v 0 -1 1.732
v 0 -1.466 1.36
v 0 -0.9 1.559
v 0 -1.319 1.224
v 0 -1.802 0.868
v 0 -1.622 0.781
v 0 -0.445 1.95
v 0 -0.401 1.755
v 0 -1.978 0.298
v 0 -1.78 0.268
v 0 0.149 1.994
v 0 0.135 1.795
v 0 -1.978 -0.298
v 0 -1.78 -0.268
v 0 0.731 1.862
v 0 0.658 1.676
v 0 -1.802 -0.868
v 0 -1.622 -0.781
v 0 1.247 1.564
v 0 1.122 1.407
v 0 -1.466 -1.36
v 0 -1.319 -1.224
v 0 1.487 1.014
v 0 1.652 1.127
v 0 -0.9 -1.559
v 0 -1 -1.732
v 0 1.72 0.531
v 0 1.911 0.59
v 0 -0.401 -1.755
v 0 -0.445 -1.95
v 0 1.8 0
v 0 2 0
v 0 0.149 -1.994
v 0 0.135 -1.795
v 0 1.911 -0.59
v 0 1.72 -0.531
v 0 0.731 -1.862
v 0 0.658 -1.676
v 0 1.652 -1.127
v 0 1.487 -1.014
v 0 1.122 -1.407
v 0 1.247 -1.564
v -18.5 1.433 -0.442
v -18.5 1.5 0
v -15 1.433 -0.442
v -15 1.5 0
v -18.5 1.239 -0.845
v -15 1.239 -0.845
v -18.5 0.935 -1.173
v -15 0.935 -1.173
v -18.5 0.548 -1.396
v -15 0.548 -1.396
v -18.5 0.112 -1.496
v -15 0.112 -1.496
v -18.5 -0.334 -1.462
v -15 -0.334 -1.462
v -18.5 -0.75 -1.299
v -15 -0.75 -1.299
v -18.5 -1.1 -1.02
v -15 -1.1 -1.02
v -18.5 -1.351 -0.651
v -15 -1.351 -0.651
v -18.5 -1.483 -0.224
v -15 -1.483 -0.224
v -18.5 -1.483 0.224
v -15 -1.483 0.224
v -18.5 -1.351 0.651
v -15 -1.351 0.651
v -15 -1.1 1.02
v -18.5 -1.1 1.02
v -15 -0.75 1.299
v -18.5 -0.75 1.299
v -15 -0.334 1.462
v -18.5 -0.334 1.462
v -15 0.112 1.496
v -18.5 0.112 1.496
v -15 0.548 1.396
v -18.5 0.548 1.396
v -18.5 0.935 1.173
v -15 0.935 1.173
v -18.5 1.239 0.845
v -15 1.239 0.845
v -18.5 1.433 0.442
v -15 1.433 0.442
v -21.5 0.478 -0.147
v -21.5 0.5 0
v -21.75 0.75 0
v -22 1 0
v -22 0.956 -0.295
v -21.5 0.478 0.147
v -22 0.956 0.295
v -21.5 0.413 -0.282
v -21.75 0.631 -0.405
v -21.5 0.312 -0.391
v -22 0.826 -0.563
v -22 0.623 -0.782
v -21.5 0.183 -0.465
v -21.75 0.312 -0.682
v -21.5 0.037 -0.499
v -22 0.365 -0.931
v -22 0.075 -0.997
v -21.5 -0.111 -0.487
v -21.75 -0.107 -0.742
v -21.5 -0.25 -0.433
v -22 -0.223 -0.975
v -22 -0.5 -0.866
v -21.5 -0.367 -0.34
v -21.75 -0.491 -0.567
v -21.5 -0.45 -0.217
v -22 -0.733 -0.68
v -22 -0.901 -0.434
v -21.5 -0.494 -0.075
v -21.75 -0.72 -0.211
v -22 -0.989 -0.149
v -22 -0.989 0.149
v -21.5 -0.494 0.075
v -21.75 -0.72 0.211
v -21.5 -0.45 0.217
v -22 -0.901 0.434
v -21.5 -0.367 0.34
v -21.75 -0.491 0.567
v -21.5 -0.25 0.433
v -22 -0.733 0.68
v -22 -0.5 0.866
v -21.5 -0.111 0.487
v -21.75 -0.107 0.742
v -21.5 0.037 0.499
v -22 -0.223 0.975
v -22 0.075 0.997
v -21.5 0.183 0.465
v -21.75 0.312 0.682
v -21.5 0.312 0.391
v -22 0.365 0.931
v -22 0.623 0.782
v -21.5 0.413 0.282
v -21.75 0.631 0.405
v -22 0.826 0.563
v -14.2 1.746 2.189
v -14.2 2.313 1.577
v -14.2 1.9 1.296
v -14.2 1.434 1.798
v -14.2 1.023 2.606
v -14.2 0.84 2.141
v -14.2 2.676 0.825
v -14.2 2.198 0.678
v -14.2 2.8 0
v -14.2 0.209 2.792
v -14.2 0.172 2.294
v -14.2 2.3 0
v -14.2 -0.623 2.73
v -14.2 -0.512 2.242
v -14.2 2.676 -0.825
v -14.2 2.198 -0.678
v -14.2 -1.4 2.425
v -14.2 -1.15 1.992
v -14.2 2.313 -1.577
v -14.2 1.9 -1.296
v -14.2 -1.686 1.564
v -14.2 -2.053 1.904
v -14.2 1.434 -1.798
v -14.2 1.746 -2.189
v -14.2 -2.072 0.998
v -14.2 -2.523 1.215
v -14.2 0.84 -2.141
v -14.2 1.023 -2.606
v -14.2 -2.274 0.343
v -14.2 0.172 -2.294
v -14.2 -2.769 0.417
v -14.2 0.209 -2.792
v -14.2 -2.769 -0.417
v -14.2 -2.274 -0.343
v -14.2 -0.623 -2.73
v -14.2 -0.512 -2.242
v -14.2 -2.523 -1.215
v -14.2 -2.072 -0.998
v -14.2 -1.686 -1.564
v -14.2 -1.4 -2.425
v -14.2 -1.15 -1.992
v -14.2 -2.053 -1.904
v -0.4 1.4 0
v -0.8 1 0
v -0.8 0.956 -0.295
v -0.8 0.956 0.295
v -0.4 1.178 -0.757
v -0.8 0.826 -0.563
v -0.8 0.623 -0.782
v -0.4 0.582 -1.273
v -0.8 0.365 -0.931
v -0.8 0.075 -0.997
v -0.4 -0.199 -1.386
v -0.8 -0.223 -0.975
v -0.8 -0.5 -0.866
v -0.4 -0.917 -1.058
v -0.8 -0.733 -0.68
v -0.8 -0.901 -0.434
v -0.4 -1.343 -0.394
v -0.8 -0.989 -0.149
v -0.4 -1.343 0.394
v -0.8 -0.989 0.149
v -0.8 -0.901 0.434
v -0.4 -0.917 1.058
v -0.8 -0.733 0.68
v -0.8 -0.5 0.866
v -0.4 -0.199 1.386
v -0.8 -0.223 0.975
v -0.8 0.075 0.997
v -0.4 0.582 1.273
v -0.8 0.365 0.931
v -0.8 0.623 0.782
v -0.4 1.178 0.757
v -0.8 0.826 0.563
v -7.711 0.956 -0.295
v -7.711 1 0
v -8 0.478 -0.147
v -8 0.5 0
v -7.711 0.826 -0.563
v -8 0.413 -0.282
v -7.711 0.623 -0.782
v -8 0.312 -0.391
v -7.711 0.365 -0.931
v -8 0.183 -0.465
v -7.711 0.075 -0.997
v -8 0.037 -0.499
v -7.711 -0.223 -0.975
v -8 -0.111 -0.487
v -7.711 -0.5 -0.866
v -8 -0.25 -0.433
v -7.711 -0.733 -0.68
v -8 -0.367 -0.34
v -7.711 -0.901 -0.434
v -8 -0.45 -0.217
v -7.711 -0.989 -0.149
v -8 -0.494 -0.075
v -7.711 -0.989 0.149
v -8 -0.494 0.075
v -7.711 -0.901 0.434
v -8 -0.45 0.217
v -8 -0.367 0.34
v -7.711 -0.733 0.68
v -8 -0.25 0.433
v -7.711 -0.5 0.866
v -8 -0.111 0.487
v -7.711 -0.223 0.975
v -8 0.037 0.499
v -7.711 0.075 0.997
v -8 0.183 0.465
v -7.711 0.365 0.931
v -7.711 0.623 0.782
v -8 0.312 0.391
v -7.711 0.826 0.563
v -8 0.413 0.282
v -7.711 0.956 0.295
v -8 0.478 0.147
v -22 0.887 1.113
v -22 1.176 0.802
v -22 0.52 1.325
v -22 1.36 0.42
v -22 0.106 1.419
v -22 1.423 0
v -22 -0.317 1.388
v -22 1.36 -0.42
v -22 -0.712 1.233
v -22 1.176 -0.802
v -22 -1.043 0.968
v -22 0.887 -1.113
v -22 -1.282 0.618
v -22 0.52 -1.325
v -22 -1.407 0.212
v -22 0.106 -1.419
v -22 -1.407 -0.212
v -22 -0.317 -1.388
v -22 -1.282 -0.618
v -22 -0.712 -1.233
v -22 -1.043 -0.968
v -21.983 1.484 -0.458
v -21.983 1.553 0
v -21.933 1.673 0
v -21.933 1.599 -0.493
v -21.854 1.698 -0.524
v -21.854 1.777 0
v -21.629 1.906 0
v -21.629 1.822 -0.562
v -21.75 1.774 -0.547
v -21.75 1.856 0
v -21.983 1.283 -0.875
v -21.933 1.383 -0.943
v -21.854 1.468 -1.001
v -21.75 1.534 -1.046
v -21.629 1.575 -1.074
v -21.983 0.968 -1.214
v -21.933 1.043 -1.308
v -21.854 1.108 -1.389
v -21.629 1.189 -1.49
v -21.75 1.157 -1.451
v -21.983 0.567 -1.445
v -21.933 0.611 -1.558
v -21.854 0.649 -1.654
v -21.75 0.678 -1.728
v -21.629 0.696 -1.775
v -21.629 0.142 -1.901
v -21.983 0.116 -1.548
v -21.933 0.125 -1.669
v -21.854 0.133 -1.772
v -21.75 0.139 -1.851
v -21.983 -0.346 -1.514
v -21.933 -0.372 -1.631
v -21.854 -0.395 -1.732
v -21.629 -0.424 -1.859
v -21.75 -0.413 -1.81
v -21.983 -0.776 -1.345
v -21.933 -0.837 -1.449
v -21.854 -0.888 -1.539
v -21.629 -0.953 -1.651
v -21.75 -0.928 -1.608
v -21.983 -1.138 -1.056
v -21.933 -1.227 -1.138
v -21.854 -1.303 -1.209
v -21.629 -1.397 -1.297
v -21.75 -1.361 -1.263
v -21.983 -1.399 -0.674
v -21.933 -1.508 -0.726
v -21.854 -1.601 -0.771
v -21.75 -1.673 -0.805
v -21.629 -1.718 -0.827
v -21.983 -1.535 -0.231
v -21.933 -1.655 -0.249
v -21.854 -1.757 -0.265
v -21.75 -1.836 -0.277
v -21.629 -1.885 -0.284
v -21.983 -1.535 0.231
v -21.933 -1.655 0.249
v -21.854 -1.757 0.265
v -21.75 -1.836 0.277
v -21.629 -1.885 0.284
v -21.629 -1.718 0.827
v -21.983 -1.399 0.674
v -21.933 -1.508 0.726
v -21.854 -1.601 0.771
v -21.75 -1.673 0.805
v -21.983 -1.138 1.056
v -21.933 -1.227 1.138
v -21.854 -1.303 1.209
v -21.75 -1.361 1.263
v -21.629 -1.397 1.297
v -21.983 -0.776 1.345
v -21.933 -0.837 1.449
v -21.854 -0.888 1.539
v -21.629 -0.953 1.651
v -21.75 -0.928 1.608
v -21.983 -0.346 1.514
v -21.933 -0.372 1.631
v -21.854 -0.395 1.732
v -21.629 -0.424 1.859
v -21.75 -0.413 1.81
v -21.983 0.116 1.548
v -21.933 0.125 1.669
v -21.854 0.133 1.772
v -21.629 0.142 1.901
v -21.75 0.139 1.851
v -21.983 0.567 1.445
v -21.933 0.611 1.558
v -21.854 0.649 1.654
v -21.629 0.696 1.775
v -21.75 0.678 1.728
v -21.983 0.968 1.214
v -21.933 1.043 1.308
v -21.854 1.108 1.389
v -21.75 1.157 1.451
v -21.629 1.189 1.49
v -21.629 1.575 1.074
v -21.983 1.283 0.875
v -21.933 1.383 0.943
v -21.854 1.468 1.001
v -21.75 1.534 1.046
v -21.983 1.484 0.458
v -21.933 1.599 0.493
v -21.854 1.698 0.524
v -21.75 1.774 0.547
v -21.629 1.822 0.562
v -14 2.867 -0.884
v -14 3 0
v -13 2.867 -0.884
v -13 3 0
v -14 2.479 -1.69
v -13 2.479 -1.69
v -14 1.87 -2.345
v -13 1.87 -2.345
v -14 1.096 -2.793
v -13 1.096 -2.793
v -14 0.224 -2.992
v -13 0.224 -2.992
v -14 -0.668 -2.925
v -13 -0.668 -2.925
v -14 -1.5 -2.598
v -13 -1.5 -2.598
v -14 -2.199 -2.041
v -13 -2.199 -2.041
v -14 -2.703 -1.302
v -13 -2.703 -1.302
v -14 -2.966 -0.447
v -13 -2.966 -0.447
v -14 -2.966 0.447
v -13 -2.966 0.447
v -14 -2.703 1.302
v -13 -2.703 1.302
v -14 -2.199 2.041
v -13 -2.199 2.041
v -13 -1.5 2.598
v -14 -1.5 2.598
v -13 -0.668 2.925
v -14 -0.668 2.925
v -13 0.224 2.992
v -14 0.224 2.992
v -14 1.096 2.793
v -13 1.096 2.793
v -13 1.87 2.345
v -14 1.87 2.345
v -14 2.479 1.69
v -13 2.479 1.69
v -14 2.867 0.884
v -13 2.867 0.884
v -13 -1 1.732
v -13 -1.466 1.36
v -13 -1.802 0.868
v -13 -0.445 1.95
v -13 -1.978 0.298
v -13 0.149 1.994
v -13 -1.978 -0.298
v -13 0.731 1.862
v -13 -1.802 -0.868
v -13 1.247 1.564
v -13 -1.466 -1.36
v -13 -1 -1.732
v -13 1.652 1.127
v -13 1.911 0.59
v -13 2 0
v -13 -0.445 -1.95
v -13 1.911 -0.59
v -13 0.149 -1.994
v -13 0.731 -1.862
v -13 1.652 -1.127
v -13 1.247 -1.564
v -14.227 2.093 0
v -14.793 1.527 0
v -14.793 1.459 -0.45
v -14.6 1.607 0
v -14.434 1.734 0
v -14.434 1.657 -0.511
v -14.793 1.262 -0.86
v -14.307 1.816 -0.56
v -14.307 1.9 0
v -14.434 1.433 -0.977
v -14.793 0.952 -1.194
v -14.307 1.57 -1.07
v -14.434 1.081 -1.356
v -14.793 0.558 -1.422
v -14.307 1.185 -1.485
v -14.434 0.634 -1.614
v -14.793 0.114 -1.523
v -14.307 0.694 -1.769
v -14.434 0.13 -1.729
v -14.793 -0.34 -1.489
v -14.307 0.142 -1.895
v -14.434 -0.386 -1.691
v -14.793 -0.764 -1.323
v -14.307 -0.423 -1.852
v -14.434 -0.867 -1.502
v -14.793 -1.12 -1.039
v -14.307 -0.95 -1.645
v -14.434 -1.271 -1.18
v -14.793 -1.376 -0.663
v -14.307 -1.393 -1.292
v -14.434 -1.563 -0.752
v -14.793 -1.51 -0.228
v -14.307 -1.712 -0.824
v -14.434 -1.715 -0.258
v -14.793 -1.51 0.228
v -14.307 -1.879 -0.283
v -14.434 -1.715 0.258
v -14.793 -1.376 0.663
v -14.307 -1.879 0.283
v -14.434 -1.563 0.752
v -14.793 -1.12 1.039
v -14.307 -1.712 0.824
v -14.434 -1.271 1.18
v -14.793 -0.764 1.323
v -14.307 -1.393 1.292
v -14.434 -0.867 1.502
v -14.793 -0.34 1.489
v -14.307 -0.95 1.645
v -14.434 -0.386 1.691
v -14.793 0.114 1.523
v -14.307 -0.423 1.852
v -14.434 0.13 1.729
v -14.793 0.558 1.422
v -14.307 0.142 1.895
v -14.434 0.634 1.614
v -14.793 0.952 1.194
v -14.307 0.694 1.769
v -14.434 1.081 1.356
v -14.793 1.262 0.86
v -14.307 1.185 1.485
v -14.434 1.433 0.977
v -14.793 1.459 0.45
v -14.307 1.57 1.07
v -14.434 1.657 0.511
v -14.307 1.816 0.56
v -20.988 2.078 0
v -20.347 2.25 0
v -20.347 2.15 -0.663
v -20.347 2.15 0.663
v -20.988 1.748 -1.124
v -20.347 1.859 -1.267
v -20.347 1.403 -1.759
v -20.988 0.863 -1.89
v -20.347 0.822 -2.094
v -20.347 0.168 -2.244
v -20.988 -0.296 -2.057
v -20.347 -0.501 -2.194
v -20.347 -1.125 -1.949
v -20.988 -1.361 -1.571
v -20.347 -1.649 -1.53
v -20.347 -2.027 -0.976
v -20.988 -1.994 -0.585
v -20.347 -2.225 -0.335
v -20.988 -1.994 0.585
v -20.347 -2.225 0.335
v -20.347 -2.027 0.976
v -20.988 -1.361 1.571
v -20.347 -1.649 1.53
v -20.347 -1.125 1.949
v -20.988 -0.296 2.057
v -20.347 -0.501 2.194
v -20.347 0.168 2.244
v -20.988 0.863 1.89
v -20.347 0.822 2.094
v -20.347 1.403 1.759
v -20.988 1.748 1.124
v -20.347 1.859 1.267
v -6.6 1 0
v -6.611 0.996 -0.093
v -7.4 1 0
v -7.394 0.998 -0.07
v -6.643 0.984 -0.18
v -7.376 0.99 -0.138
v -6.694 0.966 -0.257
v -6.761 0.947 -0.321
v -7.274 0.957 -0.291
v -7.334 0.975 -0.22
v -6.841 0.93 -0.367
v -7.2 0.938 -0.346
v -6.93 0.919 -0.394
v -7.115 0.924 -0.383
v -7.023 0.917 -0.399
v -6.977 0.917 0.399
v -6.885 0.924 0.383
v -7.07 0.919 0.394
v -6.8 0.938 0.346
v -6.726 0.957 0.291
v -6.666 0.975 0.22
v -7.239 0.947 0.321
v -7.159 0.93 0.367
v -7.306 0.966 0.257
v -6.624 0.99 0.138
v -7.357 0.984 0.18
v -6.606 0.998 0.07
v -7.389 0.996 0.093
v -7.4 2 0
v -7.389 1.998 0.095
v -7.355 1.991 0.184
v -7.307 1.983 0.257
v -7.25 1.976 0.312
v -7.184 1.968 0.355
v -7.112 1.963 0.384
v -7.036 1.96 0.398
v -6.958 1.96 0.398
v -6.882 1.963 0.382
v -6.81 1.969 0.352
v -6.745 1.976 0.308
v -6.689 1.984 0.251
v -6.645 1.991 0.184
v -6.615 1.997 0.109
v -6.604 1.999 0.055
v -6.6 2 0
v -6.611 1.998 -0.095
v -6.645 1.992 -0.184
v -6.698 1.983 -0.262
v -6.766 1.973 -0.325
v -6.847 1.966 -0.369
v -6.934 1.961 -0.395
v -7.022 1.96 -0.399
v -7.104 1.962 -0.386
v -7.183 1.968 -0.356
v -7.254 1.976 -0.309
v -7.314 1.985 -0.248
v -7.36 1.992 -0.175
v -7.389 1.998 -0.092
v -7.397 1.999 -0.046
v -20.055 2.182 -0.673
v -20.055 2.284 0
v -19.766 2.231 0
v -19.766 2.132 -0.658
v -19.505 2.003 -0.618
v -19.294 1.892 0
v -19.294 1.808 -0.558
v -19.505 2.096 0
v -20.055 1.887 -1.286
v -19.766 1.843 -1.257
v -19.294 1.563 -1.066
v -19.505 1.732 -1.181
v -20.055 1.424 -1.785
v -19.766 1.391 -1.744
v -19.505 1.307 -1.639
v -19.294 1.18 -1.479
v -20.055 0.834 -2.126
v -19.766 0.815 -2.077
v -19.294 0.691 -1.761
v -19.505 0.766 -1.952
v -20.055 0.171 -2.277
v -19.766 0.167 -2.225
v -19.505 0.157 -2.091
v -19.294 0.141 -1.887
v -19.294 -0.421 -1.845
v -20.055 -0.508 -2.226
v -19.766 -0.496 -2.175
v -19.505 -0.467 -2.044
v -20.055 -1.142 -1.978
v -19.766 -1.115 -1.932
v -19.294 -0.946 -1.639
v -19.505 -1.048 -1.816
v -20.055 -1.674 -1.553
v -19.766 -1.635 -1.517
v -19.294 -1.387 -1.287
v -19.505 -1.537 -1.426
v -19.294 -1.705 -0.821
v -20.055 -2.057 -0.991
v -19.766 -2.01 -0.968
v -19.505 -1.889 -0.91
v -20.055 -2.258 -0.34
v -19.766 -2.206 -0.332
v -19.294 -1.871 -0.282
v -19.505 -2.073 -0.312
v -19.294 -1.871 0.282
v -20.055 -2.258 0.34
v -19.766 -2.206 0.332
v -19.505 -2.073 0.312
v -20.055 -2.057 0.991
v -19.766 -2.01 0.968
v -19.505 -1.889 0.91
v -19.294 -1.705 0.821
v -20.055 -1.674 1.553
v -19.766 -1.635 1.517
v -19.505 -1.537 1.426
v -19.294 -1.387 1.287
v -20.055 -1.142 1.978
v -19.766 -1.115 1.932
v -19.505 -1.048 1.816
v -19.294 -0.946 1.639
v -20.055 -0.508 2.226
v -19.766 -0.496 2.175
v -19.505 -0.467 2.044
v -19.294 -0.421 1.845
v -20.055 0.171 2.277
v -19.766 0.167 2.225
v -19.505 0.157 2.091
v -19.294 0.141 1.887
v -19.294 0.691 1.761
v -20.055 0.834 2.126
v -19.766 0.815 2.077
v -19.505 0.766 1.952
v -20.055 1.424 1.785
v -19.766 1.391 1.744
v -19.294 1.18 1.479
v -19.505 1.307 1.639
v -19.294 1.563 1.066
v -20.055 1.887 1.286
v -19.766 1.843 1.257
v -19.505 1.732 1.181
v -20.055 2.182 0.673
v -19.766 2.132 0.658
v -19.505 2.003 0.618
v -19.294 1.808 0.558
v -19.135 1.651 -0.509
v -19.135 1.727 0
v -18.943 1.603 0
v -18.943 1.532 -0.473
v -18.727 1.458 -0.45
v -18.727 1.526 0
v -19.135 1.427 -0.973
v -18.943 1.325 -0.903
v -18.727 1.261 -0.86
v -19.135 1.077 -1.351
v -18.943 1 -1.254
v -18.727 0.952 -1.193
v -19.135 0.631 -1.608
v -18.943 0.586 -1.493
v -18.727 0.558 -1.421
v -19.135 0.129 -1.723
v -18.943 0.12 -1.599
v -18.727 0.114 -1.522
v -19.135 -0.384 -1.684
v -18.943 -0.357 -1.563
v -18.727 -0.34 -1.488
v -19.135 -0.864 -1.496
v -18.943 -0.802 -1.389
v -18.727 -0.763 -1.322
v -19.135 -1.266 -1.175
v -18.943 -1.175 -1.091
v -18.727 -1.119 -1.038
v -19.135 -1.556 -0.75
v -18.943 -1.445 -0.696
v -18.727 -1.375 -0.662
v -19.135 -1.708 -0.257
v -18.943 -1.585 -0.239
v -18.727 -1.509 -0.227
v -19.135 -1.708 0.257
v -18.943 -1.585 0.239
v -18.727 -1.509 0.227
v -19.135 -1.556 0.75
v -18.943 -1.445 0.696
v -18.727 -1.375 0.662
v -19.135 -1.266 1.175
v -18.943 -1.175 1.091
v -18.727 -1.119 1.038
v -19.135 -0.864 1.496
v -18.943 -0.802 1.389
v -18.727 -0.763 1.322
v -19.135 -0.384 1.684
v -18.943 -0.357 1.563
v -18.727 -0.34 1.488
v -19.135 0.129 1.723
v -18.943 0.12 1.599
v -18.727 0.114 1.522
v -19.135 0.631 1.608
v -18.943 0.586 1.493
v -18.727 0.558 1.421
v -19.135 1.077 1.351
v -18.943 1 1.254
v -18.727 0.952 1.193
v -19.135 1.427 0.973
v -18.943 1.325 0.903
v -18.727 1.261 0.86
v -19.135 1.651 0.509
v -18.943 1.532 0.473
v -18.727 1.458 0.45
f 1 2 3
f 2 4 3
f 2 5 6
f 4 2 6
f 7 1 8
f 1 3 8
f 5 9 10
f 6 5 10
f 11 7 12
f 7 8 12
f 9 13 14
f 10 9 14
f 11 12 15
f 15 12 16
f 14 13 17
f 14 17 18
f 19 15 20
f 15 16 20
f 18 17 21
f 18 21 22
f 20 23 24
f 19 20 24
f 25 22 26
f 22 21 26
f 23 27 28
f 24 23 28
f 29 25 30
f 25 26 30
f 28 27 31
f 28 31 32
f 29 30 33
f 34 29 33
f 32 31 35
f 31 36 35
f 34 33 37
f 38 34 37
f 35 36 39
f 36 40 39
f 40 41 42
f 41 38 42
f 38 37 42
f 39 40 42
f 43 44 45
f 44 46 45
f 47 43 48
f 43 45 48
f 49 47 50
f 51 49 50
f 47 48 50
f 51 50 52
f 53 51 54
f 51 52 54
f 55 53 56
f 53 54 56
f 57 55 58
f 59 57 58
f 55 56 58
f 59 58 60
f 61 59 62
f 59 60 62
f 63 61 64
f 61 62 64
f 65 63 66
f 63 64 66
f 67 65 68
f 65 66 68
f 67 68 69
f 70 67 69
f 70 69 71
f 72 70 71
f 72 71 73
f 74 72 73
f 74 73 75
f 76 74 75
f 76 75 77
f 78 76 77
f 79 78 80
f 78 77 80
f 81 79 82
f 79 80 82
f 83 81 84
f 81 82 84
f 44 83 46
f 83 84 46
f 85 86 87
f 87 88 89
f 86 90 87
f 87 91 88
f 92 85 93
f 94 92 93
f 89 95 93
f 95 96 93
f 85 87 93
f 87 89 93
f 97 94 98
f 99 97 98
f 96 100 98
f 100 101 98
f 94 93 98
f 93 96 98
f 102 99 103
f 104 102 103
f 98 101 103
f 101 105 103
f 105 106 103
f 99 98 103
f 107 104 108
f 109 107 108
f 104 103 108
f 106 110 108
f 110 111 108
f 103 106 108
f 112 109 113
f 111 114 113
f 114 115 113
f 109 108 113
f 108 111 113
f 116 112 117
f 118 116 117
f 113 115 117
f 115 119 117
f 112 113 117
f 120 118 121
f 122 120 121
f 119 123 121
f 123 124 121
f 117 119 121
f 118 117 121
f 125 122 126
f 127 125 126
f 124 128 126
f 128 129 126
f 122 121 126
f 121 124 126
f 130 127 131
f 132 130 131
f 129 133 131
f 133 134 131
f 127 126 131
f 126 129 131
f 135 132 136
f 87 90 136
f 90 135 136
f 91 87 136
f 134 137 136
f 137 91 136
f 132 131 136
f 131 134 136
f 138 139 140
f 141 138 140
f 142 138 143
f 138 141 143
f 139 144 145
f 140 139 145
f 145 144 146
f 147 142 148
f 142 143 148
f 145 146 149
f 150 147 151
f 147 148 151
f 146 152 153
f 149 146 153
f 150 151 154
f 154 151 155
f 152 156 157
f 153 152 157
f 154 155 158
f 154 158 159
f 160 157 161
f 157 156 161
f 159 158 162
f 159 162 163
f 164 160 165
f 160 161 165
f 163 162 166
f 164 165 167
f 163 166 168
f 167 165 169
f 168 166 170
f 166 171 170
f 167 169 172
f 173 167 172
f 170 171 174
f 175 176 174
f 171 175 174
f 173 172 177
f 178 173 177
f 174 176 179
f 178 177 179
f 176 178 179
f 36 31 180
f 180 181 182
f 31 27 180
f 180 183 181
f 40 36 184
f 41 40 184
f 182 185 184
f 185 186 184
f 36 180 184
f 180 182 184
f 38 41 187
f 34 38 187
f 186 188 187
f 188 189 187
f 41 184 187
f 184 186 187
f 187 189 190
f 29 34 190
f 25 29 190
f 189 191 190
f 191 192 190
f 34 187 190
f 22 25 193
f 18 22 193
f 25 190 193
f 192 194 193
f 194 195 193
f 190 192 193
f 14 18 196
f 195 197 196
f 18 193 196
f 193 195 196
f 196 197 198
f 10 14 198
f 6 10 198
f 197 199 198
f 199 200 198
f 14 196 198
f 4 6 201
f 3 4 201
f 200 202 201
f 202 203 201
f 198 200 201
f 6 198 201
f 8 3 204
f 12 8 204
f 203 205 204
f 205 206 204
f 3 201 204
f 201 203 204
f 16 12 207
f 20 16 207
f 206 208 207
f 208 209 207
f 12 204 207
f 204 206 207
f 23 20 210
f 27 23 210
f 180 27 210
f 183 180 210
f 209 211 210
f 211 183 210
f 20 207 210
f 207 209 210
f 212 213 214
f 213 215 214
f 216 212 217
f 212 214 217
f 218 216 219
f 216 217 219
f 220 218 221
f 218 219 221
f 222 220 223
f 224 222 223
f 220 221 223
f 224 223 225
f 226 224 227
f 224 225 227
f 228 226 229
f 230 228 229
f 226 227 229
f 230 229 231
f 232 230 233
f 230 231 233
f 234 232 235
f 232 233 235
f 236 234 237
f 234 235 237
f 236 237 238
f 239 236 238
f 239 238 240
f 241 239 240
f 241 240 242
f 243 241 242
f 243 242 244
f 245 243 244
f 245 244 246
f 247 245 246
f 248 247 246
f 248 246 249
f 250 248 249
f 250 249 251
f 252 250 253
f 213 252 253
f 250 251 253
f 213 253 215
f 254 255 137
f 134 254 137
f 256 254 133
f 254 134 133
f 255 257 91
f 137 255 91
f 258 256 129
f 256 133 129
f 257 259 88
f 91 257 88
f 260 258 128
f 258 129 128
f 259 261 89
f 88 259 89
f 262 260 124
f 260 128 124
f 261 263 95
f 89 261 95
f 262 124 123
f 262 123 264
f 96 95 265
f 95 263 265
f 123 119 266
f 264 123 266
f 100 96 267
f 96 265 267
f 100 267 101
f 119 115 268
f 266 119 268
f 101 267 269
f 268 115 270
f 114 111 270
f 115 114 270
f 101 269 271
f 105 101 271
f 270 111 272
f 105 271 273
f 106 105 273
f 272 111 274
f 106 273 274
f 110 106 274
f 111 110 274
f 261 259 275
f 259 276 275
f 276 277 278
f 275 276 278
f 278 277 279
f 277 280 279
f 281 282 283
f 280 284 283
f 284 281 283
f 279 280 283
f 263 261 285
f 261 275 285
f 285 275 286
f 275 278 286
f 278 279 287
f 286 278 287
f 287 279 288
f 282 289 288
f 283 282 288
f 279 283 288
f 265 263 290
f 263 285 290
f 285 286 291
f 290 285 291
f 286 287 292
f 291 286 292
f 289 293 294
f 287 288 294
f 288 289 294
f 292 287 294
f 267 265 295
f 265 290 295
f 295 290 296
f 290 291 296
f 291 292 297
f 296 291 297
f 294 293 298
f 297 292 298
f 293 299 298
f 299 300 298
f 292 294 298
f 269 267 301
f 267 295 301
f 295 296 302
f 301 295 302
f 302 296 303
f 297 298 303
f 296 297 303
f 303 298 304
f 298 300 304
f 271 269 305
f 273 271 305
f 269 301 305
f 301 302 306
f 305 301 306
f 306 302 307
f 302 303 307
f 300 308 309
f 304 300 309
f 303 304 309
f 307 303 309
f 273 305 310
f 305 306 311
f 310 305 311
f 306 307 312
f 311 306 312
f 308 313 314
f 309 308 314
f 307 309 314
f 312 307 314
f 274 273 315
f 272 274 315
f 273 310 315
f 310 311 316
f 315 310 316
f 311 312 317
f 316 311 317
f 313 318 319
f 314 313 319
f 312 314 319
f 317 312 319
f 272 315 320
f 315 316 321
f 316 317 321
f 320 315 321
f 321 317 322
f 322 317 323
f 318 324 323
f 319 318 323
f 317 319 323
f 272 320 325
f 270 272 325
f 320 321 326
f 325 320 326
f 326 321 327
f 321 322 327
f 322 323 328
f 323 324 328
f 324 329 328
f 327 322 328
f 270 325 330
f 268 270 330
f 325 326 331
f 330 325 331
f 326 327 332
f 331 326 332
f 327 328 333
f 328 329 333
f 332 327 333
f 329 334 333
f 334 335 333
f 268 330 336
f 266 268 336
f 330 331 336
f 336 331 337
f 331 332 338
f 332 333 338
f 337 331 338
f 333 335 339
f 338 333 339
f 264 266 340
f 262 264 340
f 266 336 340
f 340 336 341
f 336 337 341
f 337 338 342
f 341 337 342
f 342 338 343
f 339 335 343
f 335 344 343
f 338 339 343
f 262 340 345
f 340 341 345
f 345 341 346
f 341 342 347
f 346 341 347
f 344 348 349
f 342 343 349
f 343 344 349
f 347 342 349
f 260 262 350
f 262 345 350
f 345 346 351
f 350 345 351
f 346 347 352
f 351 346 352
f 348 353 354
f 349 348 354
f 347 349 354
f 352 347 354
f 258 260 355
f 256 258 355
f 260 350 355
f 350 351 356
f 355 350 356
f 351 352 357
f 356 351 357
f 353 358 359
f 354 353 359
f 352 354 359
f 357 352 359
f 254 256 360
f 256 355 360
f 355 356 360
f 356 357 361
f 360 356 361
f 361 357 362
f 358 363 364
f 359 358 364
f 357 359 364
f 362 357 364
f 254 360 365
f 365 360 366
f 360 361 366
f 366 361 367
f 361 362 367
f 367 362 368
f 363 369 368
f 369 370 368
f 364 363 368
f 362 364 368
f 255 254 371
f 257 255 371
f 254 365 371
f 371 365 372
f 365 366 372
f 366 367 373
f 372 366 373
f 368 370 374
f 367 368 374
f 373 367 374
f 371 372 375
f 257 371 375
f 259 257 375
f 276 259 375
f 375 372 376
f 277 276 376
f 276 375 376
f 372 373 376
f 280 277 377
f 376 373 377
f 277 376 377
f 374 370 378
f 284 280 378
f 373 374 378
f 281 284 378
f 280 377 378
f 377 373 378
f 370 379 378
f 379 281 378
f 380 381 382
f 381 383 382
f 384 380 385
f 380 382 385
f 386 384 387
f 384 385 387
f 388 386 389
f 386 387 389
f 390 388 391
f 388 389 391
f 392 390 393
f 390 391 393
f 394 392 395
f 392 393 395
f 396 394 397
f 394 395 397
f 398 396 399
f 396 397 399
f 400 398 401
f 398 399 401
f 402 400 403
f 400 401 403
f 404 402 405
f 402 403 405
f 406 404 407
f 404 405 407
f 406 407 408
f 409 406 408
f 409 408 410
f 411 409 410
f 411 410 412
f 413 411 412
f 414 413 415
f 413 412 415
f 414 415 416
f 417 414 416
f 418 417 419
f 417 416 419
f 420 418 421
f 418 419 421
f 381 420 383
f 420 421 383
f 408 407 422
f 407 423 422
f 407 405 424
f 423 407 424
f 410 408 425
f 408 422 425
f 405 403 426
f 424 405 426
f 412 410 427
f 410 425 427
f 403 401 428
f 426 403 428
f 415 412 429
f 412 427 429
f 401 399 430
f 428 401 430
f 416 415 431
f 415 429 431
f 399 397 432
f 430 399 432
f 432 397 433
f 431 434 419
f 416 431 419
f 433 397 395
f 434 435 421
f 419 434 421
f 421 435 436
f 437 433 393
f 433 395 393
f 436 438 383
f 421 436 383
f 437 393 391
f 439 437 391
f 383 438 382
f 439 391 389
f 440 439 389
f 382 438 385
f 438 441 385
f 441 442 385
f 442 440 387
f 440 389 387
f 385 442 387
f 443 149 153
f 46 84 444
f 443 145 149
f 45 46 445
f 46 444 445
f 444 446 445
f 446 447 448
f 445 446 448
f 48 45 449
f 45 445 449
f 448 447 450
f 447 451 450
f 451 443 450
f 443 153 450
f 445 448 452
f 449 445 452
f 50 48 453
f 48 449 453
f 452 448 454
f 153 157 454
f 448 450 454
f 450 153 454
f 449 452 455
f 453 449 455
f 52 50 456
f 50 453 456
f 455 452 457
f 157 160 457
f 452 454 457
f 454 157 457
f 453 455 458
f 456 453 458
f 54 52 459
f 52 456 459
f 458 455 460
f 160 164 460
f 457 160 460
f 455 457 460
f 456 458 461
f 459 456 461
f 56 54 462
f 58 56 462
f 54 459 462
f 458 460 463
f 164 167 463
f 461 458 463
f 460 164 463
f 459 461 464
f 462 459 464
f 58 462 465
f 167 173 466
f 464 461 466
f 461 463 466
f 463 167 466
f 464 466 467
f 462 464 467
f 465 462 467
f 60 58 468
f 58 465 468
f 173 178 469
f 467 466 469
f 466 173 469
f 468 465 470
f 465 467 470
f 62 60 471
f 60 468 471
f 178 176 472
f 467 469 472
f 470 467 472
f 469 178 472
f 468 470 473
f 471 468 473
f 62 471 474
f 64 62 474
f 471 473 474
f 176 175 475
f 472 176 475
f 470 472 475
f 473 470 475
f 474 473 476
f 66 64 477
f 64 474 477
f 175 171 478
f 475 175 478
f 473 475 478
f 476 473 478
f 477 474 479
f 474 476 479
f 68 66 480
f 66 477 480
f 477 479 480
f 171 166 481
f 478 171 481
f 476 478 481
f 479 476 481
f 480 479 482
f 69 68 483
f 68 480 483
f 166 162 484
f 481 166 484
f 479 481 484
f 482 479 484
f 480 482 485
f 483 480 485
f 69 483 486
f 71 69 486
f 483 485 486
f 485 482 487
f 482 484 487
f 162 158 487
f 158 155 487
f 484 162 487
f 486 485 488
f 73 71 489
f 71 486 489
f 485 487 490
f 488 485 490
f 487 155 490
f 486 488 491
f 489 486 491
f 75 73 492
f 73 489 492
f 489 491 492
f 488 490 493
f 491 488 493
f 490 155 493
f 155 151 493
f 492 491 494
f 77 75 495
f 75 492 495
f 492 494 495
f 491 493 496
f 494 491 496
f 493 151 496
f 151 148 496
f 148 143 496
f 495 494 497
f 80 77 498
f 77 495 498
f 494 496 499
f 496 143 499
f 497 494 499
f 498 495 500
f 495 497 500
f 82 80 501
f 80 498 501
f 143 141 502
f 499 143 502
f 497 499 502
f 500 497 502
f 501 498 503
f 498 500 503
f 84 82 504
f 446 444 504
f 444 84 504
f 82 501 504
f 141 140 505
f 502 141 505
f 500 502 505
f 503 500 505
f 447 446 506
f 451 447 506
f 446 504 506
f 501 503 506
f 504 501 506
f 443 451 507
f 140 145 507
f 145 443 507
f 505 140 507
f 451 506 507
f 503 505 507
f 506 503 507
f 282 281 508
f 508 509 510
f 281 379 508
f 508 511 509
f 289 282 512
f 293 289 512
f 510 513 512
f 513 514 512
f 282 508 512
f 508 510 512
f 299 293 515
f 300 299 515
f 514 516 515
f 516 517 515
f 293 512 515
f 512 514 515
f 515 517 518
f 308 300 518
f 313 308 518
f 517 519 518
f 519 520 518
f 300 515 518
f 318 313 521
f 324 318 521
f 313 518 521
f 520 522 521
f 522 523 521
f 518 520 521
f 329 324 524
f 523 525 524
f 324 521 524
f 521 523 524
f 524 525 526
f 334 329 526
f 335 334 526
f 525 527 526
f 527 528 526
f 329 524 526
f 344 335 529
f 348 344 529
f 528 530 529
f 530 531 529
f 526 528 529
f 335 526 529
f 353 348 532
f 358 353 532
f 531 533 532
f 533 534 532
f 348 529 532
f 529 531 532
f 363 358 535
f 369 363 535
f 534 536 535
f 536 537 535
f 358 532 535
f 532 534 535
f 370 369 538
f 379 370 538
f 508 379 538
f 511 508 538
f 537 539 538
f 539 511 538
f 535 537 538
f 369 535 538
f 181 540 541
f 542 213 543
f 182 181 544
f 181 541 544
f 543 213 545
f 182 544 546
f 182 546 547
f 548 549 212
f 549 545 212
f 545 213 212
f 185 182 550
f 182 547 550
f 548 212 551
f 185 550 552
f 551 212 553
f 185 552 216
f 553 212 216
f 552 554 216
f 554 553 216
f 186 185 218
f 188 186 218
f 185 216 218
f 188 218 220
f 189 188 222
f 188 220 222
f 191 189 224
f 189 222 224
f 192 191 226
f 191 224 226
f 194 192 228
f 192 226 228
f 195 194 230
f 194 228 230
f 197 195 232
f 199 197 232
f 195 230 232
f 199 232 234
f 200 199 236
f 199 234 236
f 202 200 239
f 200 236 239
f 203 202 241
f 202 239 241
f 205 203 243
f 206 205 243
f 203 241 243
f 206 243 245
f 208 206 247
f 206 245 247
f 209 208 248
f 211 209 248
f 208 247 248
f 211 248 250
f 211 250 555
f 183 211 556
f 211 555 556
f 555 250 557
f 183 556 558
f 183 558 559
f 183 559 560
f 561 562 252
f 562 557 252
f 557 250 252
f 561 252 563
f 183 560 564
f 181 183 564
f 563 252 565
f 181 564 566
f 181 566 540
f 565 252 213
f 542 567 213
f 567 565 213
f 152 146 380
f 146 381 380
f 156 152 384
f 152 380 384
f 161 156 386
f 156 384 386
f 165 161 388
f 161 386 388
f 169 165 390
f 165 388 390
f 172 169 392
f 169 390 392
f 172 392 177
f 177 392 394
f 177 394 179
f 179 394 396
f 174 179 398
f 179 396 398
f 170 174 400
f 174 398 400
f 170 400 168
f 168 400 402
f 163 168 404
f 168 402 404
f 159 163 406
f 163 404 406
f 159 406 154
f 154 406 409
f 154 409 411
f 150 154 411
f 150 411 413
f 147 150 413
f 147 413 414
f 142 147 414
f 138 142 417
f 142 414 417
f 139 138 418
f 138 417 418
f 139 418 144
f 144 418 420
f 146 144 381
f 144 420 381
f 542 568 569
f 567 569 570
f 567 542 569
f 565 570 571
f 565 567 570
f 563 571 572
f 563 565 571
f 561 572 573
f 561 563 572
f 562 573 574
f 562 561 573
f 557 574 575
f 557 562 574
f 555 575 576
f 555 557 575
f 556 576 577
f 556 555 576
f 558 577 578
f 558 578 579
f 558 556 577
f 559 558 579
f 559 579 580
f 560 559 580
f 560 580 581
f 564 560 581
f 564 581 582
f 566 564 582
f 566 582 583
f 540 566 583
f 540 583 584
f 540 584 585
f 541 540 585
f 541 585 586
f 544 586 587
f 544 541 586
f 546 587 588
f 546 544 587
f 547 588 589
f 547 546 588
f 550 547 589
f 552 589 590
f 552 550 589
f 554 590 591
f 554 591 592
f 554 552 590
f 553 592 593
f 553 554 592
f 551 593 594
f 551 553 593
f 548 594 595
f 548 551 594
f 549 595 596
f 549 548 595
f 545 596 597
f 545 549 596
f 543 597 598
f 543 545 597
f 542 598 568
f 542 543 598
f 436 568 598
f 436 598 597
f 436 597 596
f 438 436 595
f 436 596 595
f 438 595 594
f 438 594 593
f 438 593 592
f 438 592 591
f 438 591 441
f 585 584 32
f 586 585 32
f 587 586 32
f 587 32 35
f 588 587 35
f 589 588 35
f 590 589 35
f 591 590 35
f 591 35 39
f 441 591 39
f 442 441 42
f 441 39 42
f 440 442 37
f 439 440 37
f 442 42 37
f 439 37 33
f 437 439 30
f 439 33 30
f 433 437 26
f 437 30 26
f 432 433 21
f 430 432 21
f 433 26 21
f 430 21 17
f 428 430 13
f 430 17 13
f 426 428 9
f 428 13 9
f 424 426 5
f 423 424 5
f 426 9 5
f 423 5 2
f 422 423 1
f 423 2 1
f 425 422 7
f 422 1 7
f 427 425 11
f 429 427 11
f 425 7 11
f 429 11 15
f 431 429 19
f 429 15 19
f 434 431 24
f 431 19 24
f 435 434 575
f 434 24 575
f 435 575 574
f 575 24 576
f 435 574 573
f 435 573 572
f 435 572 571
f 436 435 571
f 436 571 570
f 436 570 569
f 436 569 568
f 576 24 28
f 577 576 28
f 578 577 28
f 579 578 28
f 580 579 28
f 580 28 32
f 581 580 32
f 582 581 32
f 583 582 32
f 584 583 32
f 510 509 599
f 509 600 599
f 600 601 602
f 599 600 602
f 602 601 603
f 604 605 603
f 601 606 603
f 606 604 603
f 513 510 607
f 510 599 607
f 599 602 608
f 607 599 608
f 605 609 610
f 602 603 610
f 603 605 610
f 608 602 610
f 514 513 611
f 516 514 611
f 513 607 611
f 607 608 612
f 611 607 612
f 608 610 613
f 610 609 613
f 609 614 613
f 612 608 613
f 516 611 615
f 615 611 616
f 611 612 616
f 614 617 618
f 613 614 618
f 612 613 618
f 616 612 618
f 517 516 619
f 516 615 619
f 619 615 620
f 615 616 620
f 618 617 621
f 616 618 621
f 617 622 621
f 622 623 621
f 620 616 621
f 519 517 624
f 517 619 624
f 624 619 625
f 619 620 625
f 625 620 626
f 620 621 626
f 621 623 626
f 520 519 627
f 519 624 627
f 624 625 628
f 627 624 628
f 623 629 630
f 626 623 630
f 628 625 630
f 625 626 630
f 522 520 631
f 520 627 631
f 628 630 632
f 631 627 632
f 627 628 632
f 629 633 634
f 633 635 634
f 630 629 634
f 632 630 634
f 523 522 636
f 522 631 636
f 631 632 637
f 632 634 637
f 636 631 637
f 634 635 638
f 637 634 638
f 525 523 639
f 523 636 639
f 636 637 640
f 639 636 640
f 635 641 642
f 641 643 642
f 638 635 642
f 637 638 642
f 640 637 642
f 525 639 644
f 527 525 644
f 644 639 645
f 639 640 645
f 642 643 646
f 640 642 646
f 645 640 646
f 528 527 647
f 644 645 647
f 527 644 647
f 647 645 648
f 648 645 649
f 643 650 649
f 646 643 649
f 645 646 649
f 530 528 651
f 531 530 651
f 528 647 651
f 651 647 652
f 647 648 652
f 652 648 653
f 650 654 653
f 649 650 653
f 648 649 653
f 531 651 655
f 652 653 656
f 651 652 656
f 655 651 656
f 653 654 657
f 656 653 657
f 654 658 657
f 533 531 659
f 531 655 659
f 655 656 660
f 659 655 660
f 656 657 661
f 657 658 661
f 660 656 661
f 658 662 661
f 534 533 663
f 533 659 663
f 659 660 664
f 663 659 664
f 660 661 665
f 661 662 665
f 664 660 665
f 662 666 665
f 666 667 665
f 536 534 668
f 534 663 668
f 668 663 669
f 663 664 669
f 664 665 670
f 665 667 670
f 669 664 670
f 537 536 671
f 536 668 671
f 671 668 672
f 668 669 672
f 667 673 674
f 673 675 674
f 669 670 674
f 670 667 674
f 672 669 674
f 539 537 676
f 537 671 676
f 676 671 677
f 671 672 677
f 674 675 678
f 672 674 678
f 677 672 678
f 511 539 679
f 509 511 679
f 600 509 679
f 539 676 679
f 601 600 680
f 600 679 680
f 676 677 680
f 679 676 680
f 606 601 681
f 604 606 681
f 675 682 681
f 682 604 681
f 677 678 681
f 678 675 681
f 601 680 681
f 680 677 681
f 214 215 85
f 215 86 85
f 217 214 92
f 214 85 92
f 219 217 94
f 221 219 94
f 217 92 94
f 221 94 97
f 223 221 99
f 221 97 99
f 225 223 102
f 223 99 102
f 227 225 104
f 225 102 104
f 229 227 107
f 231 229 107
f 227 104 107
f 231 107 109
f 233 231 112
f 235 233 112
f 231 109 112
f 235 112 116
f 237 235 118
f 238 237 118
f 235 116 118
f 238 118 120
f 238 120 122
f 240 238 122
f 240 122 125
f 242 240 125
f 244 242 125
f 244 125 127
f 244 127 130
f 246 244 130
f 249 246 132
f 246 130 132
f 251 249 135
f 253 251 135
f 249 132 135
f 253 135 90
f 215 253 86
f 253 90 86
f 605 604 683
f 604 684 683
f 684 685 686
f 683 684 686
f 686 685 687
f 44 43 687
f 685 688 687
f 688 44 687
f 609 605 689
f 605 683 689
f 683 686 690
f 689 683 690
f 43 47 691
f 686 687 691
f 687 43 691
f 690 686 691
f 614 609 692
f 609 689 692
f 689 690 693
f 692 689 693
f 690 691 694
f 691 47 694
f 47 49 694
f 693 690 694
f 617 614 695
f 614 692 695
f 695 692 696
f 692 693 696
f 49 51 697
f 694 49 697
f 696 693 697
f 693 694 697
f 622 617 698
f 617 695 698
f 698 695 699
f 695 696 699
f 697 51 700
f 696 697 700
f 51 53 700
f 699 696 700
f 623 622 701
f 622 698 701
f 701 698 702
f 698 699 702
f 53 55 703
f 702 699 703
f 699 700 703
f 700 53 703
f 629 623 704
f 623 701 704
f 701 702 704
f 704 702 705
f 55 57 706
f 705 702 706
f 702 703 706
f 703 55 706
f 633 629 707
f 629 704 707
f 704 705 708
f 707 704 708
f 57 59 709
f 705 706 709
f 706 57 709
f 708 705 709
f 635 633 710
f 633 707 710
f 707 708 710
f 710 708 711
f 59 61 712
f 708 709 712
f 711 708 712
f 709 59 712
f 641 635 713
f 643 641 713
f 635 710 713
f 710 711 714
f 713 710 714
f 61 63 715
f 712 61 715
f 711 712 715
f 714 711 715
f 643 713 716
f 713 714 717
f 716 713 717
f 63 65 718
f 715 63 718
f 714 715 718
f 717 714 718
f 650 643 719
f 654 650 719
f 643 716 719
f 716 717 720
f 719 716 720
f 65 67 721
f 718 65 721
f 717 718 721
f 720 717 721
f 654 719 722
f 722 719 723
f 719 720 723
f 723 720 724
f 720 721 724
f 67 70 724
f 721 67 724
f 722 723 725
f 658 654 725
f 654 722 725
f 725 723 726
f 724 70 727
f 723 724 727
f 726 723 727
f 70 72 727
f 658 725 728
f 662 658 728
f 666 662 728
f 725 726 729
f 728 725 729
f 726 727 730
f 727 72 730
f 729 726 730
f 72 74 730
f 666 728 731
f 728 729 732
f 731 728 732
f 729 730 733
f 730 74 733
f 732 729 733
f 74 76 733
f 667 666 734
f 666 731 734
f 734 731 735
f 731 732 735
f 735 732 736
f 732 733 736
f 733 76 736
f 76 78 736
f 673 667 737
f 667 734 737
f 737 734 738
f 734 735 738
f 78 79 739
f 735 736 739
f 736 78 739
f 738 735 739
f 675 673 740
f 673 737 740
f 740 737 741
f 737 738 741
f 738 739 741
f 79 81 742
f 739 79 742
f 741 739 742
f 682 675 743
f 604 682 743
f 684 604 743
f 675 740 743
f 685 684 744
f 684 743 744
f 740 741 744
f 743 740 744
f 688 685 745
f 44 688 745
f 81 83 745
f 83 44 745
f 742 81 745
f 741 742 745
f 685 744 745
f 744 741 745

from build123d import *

# Parameters (mm, degrees)
SKETCH2_R          = 0.4
CUT_EXTRUDE1_DEPTH = 4


with BuildPart() as part:
    # Sketch1 → Revolve1 (revolve)
    with BuildSketch(Plane.XY):
        with BuildLine():
            Line((0, 1.8), (-0.8, 1))
            Line((-0.8, 1), (-7.711324865, 1))
            Line((-7.711324865, 1), (-8, 0.5))
            Line((-8, 0.5), (-21.5, 0.5))
            Line((-21.5, 0.5), (-22, 1))
            Line((-22, 1), (-22, 1.423349476))
            ThreePointArc((-22, 1.423349476), (-21.89667667, 1.72773019), (-21.629409523, 1.906312389))
            Line((-21.629409523, 1.906312389), (-20.346749895, 2.25))
            ThreePointArc((-20.346749895, 2.25), (-19.766015063, 2.23084248), (-19.293965425, 1.892037087))
            ThreePointArc((-19.293965425, 1.892037087), (-18.942739815, 1.603349869), (-18.5, 1.5))
            Line((-18.5, 1.5), (-15, 1.5))
            ThreePointArc((-15, 1.5), (-14.434314575, 1.734314575), (-14.2, 2.3))
            Line((-14.2, 2.3), (-14.2, 2.8))
            Line((-14.2, 2.8), (-14, 3))
            Line((-14, 3), (-13, 3))
            Line((-13, 3), (-13, 2))
            Line((-13, 2), (0, 2))
            Line((0, 2), (0, 1.8))
        make_face()
    revolve(axis=Axis((0, 0, 0), (-1, 0, 0)))

    # Sketch2 → Cut-Extrude1 (cut, through all)
    with BuildSketch(Plane(origin=(0, 0, 0), x_dir=(1, 0, 0), z_dir=(0, 1, 0))):
        with Locations(Location((-7, 0, 0), (0, 0, 180))):  # turned: the seam where the file's is
            Circle(SKETCH2_R)
    extrude(amount=CUT_EXTRUDE1_DEPTH, mode=Mode.SUBTRACT)


solid = part.part
